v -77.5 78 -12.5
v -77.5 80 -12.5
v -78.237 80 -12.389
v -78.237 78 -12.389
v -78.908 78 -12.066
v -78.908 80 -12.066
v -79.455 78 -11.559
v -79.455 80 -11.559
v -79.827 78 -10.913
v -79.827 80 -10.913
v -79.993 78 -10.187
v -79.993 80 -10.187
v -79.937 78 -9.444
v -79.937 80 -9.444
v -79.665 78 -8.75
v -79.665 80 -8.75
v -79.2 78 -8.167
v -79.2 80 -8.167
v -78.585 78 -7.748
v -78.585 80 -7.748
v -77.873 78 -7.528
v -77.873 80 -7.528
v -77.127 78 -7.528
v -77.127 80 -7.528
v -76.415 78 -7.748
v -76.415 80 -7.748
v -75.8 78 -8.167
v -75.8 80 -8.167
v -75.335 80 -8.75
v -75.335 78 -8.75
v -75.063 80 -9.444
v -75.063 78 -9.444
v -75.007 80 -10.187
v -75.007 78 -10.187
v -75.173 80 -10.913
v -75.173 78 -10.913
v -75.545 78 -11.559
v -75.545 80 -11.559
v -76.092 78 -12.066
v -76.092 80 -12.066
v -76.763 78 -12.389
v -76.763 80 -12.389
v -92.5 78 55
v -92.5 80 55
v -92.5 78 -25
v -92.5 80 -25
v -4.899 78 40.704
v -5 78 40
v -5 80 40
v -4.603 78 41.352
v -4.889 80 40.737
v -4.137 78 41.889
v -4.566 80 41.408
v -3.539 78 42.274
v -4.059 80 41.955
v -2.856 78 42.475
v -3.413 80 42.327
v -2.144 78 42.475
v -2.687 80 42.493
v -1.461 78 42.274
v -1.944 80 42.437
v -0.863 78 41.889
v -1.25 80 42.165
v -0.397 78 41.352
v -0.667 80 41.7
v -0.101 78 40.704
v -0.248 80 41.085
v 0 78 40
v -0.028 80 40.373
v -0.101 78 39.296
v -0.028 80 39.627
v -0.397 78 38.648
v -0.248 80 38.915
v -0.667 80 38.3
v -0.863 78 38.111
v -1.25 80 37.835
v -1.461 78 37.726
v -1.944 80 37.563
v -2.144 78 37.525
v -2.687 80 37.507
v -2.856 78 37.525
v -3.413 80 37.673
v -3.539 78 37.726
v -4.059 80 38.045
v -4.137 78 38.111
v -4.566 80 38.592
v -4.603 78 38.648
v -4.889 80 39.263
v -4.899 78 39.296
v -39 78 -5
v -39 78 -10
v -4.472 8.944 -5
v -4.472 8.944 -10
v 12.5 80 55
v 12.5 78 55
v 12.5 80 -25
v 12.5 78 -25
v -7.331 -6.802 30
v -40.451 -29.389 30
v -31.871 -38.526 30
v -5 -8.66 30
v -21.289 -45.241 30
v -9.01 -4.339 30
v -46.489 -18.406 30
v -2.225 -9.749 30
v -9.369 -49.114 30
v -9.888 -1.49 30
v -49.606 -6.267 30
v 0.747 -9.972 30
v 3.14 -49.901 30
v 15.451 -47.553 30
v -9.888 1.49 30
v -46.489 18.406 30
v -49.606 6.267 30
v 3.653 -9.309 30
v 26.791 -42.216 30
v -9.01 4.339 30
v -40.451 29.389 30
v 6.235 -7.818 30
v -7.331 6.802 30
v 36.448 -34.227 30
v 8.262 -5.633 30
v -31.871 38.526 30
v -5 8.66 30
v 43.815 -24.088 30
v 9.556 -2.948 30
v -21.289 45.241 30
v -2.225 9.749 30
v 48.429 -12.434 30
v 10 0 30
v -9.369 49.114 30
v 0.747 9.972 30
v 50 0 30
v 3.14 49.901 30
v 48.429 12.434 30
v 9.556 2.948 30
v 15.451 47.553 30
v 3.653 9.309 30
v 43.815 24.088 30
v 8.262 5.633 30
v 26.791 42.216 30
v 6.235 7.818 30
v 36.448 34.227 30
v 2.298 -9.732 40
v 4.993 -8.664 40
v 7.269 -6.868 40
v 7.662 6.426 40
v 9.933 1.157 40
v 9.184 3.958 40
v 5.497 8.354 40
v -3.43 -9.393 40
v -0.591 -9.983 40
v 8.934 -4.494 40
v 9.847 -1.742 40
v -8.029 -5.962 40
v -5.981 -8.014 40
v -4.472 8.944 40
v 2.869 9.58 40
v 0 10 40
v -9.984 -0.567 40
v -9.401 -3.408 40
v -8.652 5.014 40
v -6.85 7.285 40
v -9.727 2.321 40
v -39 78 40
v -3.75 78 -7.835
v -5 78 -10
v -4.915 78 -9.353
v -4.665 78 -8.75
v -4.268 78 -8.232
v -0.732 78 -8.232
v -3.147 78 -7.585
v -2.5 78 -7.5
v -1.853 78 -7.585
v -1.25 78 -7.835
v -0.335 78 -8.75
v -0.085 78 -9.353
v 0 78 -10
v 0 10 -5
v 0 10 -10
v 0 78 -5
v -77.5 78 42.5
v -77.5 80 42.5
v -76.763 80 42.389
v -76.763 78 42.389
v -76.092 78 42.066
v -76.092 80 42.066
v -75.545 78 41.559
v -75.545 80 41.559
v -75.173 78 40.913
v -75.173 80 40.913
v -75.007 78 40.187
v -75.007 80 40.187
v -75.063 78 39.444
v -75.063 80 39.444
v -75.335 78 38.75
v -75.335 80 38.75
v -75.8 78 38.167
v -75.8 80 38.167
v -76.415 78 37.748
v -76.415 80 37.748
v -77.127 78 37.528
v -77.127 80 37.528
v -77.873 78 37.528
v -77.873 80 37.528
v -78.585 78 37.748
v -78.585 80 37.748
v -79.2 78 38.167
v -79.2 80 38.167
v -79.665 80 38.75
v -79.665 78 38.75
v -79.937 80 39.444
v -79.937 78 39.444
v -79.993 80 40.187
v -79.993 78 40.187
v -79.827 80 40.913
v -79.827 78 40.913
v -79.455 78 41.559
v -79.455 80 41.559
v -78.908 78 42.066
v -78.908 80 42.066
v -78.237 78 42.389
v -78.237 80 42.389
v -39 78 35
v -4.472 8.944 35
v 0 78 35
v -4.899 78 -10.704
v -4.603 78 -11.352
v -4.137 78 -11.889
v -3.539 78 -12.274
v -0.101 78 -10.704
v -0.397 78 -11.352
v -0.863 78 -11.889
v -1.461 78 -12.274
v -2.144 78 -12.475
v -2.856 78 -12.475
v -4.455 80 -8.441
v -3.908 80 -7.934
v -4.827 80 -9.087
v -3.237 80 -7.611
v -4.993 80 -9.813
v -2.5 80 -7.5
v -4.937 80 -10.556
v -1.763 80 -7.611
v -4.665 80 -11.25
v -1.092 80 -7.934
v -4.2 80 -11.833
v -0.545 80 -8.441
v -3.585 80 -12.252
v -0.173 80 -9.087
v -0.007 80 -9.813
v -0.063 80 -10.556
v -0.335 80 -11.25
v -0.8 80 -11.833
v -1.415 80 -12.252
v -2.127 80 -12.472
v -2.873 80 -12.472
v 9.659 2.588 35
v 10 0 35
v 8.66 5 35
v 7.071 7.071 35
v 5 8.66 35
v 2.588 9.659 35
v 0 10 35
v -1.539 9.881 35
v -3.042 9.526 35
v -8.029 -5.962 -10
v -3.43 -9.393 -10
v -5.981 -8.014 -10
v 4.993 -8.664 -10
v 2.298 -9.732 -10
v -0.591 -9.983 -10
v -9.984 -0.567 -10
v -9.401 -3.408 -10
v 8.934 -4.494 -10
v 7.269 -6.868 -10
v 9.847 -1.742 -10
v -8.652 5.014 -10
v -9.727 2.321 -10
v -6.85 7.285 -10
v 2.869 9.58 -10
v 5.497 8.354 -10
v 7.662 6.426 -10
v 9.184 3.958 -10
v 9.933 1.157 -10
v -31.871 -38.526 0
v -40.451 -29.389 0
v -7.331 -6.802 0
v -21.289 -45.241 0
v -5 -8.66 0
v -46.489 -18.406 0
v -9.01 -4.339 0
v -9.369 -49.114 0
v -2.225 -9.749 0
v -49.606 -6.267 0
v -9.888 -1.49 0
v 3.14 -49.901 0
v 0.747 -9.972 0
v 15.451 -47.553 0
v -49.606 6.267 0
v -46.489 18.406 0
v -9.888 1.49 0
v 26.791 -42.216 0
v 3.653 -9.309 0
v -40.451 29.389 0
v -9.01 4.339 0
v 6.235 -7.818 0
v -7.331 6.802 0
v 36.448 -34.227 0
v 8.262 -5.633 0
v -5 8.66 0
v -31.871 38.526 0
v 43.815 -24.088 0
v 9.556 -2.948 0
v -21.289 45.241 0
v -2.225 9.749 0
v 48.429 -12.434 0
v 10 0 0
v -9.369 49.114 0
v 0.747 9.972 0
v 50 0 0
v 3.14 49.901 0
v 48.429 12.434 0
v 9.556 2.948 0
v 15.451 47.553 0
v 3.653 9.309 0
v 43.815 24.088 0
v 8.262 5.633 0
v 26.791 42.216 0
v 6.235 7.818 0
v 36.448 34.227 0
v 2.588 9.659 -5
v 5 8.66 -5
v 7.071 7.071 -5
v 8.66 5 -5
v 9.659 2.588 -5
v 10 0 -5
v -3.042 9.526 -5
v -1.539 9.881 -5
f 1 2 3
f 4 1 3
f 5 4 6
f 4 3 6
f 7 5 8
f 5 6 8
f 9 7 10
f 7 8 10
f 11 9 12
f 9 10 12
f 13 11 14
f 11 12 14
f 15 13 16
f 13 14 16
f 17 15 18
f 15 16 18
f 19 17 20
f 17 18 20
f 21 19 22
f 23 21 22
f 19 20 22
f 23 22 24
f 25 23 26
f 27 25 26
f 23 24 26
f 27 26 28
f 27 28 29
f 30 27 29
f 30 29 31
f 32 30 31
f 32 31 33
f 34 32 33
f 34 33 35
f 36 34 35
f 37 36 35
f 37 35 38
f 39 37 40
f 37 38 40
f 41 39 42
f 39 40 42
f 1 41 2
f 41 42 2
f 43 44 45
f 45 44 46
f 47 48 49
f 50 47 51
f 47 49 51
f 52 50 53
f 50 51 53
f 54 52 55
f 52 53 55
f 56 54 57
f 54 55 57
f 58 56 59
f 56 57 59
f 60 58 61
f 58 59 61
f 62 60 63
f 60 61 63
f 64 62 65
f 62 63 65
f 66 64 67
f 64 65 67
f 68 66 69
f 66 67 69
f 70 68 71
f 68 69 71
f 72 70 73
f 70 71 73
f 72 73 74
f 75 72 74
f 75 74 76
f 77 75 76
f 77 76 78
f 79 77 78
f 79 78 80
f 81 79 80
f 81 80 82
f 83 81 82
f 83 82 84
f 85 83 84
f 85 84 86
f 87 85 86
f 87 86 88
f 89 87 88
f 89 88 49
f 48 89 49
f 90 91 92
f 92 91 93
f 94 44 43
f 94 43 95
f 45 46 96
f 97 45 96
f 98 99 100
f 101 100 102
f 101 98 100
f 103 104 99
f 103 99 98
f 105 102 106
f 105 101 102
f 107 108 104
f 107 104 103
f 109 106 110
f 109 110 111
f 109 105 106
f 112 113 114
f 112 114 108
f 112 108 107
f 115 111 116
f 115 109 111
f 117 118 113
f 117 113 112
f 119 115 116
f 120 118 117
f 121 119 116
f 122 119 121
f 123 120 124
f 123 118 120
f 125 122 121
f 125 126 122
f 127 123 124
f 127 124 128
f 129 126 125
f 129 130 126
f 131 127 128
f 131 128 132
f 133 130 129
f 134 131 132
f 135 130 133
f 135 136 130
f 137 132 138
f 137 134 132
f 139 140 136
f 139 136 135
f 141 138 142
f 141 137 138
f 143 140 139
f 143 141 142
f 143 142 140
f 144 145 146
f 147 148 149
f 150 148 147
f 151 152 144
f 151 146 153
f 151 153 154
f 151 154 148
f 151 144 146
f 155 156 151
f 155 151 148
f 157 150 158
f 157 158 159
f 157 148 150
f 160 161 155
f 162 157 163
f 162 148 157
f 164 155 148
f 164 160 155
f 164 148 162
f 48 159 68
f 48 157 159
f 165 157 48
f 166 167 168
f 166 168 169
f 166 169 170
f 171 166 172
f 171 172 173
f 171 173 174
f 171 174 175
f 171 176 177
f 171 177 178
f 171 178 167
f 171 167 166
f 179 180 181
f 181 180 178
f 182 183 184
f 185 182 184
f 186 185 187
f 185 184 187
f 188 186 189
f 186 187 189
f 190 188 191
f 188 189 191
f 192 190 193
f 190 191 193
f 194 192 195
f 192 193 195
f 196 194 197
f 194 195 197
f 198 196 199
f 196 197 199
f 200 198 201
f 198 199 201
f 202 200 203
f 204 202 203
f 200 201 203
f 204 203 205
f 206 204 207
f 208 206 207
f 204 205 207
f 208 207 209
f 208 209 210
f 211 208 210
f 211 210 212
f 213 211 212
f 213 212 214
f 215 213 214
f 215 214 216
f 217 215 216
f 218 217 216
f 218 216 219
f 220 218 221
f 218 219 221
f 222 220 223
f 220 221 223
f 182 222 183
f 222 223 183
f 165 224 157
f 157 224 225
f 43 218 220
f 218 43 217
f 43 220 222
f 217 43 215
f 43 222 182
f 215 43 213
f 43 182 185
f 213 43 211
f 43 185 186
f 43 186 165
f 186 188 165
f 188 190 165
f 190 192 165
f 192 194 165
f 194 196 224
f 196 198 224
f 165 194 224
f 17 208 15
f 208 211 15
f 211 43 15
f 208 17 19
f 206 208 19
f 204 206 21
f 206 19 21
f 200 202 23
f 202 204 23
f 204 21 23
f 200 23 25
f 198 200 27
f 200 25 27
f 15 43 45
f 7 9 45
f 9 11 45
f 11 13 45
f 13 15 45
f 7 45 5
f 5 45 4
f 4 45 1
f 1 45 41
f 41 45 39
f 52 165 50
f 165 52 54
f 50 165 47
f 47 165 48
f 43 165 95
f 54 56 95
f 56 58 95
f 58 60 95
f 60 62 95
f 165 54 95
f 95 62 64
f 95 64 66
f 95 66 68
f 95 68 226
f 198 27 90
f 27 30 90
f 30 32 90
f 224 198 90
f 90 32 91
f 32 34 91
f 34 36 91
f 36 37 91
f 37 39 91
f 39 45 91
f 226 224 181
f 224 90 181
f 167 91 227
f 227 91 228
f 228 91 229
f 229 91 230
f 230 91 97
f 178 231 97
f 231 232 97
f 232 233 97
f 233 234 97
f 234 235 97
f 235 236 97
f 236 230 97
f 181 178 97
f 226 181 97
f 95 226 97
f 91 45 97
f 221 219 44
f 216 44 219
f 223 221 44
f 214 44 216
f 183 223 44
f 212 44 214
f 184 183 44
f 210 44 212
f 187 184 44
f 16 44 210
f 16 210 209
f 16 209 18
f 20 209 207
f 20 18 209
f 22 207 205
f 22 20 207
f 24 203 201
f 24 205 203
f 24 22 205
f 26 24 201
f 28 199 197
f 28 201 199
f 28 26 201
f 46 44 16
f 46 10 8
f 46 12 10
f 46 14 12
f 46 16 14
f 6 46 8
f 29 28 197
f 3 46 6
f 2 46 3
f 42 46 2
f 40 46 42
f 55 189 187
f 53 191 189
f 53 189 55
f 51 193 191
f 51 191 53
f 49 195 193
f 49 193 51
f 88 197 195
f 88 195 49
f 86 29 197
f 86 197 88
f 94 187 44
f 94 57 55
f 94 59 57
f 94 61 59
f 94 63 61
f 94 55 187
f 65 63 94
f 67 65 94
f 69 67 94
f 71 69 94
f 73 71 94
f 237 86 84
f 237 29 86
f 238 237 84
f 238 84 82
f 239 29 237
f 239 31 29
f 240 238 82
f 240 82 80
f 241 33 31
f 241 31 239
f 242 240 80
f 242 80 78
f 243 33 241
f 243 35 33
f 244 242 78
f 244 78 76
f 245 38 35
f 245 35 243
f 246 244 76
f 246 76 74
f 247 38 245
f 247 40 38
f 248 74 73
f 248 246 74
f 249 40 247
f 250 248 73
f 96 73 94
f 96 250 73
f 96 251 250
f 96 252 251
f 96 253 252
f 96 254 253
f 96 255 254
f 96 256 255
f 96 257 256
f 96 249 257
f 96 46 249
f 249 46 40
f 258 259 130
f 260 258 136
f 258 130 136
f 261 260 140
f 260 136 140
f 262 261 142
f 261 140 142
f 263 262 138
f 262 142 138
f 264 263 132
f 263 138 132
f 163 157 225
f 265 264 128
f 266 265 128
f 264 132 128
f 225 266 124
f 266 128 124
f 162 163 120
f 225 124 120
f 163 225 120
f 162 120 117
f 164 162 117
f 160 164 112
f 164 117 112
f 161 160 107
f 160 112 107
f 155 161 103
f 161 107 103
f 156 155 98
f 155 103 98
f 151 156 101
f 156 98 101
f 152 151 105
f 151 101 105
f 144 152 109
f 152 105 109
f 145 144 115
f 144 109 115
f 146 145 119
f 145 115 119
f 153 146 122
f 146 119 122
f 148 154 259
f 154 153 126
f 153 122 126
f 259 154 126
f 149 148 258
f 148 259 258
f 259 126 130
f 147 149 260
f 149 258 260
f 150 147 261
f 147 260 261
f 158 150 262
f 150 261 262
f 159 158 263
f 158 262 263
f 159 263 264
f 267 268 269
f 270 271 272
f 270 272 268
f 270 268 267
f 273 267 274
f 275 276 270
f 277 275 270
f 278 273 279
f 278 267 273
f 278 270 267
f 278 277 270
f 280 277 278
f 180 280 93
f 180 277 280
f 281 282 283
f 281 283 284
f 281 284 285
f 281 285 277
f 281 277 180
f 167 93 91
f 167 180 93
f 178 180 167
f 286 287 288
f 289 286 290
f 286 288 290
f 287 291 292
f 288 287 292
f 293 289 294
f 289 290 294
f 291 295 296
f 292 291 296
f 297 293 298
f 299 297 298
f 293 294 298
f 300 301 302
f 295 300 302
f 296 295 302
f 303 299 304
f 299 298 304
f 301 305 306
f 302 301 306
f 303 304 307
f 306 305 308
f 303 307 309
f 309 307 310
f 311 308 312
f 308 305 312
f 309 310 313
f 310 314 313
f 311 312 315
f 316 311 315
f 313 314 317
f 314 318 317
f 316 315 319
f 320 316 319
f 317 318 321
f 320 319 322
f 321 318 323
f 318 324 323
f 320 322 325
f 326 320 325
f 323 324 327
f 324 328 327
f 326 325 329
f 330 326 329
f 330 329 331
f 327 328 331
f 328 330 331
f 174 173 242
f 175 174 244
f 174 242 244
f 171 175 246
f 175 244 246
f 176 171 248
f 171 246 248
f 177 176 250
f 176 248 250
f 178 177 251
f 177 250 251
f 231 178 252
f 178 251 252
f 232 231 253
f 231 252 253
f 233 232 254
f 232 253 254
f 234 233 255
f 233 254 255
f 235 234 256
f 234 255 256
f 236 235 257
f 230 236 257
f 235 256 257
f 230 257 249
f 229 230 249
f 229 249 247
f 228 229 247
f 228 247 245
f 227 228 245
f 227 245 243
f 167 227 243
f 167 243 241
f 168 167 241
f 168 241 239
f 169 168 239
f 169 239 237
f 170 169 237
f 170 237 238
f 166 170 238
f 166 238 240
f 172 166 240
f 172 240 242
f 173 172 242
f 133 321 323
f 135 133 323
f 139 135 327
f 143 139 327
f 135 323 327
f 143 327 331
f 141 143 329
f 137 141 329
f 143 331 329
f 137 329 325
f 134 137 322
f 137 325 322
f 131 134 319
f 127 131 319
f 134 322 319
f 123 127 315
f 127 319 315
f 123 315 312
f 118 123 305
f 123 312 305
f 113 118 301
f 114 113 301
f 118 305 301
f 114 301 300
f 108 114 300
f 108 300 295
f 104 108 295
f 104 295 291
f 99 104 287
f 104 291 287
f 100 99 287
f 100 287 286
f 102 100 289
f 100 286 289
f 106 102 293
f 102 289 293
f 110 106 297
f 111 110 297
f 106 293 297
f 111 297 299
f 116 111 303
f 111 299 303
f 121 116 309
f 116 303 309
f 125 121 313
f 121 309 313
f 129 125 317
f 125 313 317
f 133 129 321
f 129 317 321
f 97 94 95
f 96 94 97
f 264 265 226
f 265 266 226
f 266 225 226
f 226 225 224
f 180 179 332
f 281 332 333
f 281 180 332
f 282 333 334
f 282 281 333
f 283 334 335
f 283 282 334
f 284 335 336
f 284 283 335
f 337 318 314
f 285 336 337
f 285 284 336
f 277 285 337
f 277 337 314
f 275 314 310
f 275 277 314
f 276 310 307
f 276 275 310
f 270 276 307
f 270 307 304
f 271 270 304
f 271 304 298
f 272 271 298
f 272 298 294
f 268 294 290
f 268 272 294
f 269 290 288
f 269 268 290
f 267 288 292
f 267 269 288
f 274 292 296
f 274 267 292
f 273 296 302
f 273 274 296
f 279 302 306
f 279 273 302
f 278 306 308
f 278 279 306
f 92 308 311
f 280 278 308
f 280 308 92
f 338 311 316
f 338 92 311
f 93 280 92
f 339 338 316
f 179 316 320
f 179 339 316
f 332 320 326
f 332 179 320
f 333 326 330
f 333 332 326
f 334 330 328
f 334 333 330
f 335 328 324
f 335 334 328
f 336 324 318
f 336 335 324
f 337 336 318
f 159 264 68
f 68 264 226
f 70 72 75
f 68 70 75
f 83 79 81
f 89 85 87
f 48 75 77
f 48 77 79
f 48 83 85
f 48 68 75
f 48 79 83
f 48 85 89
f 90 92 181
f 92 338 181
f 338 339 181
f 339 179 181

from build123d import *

# Parameters (mm, degrees)
SCHIZZO1_R                   = 50
ESTRUSIONE_ESTRUSIONE1_DEPTH = 30
SCHIZZO2_R                   = 10
ESTRUSIONE_ESTRUSIONE2_DEPTH = 5
ESTRUSIONE_ESTRUSIONE3_START = 5
SCHIZZO3_R                   = 10
ESTRUSIONE_ESTRUSIONE3_DEPTH = 5
SCHIZZO4_R                   = 10
ESTRUSIONE_ESTRUSIONE4_DEPTH = 5
ESTRUSIONE_ESTRUSIONE5_START = 5
SCHIZZO5_R                   = 10
ESTRUSIONE_ESTRUSIONE5_DEPTH = 5
SCHIZZO6_W                   = 105
SCHIZZO6_H                   = 80
ESTRUSIONE_ESTRUSIONE6_DEPTH = 2
SCHIZZO7_R                   = 2.5
TAGLIO_ESTRUSIONE1_DEPTH     = 2


with BuildPart() as part:
    # Schizzo1 → Estrusione-Estrusione1 (new body)
    with BuildSketch(Plane.XY):
        Circle(SCHIZZO1_R)
    extrude(amount=ESTRUSIONE_ESTRUSIONE1_DEPTH)

    # Schizzo2 → Estrusione-Estrusione2 (add)
    with BuildSketch(Plane.XY.offset(30)):
        Circle(SCHIZZO2_R)
    extrude(amount=ESTRUSIONE_ESTRUSIONE2_DEPTH)

    # Schizzo3 → Estrusione-Estrusione3 (add)
    with BuildSketch(Plane(origin=(0, 0, 0), x_dir=(-1, 0, 0), z_dir=(0, 0, -1)).offset(ESTRUSIONE_ESTRUSIONE3_START)):
        with Locations(Location((0, 0, 0), (0, 0, 180))):
            Circle(SCHIZZO3_R)
    extrude(amount=-ESTRUSIONE_ESTRUSIONE3_DEPTH)

    # Schizzo4 → Estrusione-Estrusione4 (add)
    with BuildSketch(Plane.XY.offset(35)):
        with Locations(Location((0, 0, 0), (0, 0, 116.565051177))):
            Circle(SCHIZZO4_R)
        Polygon((0, 80), (-40, 80), (0, 0), align=None)
        with BuildLine():
            Line((-4.472135955, 8.94427191), (0, 0))
            Line((0, 0), (0, 10))
            ThreePointArc((0, 10), (-2.297529205, 9.732489895), (-4.472135955, 8.94427191))
        make_face()
        with BuildLine():
            Line((0, 10), (0, 0))
            Line((0, 0), (-4.472135955, 8.94427191))
            ThreePointArc((-4.472135955, 8.94427191), (-5.257311121, -8.506508084), (10, 0))
            ThreePointArc((10, 0), (7.071067812, 7.071067812), (0, 10))
        make_face()
    extrude(amount=ESTRUSIONE_ESTRUSIONE4_DEPTH)

    # Schizzo5 → Estrusione-Estrusione5 (add)
    with BuildSketch(Plane(origin=(0, 0, -5), x_dir=(-1, 0, 0), z_dir=(0, 0, -1)).offset(ESTRUSIONE_ESTRUSIONE5_START)):
        with Locations(Location((0, 0, 0), (0, 0, 63.434948823))):
            Circle(SCHIZZO5_R)
        Polygon((40, 80), (0, 0), (0, 80), align=None)
        with BuildLine():
            Line((4.472135955, 8.94427191), (0, 0))
            Line((0, 0), (0, 10))
            ThreePointArc((0, 10), (-7.071067812, -7.071067812), (10, 0))
            ThreePointArc((10, 0), (8.506508084, 5.257311121), (4.472135955, 8.94427191))
        make_face()
        with BuildLine():
            Line((0, 10), (0, 0))
            Line((0, 0), (4.472135955, 8.94427191))
            ThreePointArc((4.472135955, 8.94427191), (2.297529205, 9.732489895), (0, 10))
        make_face()
    extrude(amount=-ESTRUSIONE_ESTRUSIONE5_DEPTH)

    # Schizzo6 → Estrusione-Estrusione6 (add)
    with BuildSketch(Plane(origin=(0, 80, 0), x_dir=(1, 0, 0), z_dir=(0, 1, 0))):
        with Locations((-40, -15)):
            Rectangle(SCHIZZO6_W, SCHIZZO6_H)
    extrude(amount=-ESTRUSIONE_ESTRUSIONE6_DEPTH)

    # Schizzo7 → Taglio-Estrusione1 (cut)
    with BuildSketch(Plane(origin=(0, 80, 0), x_dir=(1, 0, 0), z_dir=(0, 1, 0))):
        with Locations(Location((-77.5, -40, 0), (0, 0, 270))):
            Circle(SCHIZZO7_R)
        with Locations(Location((-2.5, -40, 0), (0, 0, 180))):
            Circle(SCHIZZO7_R)
        with Locations(Location((-2.5, 10, 0), (0, 0, 270))):
            Circle(SCHIZZO7_R)
        with Locations(Location((-77.5, 10, 0), (0, 0, 90))):
            Circle(SCHIZZO7_R)
    extrude(amount=-TAGLIO_ESTRUSIONE1_DEPTH, mode=Mode.SUBTRACT)


solid = part.part
